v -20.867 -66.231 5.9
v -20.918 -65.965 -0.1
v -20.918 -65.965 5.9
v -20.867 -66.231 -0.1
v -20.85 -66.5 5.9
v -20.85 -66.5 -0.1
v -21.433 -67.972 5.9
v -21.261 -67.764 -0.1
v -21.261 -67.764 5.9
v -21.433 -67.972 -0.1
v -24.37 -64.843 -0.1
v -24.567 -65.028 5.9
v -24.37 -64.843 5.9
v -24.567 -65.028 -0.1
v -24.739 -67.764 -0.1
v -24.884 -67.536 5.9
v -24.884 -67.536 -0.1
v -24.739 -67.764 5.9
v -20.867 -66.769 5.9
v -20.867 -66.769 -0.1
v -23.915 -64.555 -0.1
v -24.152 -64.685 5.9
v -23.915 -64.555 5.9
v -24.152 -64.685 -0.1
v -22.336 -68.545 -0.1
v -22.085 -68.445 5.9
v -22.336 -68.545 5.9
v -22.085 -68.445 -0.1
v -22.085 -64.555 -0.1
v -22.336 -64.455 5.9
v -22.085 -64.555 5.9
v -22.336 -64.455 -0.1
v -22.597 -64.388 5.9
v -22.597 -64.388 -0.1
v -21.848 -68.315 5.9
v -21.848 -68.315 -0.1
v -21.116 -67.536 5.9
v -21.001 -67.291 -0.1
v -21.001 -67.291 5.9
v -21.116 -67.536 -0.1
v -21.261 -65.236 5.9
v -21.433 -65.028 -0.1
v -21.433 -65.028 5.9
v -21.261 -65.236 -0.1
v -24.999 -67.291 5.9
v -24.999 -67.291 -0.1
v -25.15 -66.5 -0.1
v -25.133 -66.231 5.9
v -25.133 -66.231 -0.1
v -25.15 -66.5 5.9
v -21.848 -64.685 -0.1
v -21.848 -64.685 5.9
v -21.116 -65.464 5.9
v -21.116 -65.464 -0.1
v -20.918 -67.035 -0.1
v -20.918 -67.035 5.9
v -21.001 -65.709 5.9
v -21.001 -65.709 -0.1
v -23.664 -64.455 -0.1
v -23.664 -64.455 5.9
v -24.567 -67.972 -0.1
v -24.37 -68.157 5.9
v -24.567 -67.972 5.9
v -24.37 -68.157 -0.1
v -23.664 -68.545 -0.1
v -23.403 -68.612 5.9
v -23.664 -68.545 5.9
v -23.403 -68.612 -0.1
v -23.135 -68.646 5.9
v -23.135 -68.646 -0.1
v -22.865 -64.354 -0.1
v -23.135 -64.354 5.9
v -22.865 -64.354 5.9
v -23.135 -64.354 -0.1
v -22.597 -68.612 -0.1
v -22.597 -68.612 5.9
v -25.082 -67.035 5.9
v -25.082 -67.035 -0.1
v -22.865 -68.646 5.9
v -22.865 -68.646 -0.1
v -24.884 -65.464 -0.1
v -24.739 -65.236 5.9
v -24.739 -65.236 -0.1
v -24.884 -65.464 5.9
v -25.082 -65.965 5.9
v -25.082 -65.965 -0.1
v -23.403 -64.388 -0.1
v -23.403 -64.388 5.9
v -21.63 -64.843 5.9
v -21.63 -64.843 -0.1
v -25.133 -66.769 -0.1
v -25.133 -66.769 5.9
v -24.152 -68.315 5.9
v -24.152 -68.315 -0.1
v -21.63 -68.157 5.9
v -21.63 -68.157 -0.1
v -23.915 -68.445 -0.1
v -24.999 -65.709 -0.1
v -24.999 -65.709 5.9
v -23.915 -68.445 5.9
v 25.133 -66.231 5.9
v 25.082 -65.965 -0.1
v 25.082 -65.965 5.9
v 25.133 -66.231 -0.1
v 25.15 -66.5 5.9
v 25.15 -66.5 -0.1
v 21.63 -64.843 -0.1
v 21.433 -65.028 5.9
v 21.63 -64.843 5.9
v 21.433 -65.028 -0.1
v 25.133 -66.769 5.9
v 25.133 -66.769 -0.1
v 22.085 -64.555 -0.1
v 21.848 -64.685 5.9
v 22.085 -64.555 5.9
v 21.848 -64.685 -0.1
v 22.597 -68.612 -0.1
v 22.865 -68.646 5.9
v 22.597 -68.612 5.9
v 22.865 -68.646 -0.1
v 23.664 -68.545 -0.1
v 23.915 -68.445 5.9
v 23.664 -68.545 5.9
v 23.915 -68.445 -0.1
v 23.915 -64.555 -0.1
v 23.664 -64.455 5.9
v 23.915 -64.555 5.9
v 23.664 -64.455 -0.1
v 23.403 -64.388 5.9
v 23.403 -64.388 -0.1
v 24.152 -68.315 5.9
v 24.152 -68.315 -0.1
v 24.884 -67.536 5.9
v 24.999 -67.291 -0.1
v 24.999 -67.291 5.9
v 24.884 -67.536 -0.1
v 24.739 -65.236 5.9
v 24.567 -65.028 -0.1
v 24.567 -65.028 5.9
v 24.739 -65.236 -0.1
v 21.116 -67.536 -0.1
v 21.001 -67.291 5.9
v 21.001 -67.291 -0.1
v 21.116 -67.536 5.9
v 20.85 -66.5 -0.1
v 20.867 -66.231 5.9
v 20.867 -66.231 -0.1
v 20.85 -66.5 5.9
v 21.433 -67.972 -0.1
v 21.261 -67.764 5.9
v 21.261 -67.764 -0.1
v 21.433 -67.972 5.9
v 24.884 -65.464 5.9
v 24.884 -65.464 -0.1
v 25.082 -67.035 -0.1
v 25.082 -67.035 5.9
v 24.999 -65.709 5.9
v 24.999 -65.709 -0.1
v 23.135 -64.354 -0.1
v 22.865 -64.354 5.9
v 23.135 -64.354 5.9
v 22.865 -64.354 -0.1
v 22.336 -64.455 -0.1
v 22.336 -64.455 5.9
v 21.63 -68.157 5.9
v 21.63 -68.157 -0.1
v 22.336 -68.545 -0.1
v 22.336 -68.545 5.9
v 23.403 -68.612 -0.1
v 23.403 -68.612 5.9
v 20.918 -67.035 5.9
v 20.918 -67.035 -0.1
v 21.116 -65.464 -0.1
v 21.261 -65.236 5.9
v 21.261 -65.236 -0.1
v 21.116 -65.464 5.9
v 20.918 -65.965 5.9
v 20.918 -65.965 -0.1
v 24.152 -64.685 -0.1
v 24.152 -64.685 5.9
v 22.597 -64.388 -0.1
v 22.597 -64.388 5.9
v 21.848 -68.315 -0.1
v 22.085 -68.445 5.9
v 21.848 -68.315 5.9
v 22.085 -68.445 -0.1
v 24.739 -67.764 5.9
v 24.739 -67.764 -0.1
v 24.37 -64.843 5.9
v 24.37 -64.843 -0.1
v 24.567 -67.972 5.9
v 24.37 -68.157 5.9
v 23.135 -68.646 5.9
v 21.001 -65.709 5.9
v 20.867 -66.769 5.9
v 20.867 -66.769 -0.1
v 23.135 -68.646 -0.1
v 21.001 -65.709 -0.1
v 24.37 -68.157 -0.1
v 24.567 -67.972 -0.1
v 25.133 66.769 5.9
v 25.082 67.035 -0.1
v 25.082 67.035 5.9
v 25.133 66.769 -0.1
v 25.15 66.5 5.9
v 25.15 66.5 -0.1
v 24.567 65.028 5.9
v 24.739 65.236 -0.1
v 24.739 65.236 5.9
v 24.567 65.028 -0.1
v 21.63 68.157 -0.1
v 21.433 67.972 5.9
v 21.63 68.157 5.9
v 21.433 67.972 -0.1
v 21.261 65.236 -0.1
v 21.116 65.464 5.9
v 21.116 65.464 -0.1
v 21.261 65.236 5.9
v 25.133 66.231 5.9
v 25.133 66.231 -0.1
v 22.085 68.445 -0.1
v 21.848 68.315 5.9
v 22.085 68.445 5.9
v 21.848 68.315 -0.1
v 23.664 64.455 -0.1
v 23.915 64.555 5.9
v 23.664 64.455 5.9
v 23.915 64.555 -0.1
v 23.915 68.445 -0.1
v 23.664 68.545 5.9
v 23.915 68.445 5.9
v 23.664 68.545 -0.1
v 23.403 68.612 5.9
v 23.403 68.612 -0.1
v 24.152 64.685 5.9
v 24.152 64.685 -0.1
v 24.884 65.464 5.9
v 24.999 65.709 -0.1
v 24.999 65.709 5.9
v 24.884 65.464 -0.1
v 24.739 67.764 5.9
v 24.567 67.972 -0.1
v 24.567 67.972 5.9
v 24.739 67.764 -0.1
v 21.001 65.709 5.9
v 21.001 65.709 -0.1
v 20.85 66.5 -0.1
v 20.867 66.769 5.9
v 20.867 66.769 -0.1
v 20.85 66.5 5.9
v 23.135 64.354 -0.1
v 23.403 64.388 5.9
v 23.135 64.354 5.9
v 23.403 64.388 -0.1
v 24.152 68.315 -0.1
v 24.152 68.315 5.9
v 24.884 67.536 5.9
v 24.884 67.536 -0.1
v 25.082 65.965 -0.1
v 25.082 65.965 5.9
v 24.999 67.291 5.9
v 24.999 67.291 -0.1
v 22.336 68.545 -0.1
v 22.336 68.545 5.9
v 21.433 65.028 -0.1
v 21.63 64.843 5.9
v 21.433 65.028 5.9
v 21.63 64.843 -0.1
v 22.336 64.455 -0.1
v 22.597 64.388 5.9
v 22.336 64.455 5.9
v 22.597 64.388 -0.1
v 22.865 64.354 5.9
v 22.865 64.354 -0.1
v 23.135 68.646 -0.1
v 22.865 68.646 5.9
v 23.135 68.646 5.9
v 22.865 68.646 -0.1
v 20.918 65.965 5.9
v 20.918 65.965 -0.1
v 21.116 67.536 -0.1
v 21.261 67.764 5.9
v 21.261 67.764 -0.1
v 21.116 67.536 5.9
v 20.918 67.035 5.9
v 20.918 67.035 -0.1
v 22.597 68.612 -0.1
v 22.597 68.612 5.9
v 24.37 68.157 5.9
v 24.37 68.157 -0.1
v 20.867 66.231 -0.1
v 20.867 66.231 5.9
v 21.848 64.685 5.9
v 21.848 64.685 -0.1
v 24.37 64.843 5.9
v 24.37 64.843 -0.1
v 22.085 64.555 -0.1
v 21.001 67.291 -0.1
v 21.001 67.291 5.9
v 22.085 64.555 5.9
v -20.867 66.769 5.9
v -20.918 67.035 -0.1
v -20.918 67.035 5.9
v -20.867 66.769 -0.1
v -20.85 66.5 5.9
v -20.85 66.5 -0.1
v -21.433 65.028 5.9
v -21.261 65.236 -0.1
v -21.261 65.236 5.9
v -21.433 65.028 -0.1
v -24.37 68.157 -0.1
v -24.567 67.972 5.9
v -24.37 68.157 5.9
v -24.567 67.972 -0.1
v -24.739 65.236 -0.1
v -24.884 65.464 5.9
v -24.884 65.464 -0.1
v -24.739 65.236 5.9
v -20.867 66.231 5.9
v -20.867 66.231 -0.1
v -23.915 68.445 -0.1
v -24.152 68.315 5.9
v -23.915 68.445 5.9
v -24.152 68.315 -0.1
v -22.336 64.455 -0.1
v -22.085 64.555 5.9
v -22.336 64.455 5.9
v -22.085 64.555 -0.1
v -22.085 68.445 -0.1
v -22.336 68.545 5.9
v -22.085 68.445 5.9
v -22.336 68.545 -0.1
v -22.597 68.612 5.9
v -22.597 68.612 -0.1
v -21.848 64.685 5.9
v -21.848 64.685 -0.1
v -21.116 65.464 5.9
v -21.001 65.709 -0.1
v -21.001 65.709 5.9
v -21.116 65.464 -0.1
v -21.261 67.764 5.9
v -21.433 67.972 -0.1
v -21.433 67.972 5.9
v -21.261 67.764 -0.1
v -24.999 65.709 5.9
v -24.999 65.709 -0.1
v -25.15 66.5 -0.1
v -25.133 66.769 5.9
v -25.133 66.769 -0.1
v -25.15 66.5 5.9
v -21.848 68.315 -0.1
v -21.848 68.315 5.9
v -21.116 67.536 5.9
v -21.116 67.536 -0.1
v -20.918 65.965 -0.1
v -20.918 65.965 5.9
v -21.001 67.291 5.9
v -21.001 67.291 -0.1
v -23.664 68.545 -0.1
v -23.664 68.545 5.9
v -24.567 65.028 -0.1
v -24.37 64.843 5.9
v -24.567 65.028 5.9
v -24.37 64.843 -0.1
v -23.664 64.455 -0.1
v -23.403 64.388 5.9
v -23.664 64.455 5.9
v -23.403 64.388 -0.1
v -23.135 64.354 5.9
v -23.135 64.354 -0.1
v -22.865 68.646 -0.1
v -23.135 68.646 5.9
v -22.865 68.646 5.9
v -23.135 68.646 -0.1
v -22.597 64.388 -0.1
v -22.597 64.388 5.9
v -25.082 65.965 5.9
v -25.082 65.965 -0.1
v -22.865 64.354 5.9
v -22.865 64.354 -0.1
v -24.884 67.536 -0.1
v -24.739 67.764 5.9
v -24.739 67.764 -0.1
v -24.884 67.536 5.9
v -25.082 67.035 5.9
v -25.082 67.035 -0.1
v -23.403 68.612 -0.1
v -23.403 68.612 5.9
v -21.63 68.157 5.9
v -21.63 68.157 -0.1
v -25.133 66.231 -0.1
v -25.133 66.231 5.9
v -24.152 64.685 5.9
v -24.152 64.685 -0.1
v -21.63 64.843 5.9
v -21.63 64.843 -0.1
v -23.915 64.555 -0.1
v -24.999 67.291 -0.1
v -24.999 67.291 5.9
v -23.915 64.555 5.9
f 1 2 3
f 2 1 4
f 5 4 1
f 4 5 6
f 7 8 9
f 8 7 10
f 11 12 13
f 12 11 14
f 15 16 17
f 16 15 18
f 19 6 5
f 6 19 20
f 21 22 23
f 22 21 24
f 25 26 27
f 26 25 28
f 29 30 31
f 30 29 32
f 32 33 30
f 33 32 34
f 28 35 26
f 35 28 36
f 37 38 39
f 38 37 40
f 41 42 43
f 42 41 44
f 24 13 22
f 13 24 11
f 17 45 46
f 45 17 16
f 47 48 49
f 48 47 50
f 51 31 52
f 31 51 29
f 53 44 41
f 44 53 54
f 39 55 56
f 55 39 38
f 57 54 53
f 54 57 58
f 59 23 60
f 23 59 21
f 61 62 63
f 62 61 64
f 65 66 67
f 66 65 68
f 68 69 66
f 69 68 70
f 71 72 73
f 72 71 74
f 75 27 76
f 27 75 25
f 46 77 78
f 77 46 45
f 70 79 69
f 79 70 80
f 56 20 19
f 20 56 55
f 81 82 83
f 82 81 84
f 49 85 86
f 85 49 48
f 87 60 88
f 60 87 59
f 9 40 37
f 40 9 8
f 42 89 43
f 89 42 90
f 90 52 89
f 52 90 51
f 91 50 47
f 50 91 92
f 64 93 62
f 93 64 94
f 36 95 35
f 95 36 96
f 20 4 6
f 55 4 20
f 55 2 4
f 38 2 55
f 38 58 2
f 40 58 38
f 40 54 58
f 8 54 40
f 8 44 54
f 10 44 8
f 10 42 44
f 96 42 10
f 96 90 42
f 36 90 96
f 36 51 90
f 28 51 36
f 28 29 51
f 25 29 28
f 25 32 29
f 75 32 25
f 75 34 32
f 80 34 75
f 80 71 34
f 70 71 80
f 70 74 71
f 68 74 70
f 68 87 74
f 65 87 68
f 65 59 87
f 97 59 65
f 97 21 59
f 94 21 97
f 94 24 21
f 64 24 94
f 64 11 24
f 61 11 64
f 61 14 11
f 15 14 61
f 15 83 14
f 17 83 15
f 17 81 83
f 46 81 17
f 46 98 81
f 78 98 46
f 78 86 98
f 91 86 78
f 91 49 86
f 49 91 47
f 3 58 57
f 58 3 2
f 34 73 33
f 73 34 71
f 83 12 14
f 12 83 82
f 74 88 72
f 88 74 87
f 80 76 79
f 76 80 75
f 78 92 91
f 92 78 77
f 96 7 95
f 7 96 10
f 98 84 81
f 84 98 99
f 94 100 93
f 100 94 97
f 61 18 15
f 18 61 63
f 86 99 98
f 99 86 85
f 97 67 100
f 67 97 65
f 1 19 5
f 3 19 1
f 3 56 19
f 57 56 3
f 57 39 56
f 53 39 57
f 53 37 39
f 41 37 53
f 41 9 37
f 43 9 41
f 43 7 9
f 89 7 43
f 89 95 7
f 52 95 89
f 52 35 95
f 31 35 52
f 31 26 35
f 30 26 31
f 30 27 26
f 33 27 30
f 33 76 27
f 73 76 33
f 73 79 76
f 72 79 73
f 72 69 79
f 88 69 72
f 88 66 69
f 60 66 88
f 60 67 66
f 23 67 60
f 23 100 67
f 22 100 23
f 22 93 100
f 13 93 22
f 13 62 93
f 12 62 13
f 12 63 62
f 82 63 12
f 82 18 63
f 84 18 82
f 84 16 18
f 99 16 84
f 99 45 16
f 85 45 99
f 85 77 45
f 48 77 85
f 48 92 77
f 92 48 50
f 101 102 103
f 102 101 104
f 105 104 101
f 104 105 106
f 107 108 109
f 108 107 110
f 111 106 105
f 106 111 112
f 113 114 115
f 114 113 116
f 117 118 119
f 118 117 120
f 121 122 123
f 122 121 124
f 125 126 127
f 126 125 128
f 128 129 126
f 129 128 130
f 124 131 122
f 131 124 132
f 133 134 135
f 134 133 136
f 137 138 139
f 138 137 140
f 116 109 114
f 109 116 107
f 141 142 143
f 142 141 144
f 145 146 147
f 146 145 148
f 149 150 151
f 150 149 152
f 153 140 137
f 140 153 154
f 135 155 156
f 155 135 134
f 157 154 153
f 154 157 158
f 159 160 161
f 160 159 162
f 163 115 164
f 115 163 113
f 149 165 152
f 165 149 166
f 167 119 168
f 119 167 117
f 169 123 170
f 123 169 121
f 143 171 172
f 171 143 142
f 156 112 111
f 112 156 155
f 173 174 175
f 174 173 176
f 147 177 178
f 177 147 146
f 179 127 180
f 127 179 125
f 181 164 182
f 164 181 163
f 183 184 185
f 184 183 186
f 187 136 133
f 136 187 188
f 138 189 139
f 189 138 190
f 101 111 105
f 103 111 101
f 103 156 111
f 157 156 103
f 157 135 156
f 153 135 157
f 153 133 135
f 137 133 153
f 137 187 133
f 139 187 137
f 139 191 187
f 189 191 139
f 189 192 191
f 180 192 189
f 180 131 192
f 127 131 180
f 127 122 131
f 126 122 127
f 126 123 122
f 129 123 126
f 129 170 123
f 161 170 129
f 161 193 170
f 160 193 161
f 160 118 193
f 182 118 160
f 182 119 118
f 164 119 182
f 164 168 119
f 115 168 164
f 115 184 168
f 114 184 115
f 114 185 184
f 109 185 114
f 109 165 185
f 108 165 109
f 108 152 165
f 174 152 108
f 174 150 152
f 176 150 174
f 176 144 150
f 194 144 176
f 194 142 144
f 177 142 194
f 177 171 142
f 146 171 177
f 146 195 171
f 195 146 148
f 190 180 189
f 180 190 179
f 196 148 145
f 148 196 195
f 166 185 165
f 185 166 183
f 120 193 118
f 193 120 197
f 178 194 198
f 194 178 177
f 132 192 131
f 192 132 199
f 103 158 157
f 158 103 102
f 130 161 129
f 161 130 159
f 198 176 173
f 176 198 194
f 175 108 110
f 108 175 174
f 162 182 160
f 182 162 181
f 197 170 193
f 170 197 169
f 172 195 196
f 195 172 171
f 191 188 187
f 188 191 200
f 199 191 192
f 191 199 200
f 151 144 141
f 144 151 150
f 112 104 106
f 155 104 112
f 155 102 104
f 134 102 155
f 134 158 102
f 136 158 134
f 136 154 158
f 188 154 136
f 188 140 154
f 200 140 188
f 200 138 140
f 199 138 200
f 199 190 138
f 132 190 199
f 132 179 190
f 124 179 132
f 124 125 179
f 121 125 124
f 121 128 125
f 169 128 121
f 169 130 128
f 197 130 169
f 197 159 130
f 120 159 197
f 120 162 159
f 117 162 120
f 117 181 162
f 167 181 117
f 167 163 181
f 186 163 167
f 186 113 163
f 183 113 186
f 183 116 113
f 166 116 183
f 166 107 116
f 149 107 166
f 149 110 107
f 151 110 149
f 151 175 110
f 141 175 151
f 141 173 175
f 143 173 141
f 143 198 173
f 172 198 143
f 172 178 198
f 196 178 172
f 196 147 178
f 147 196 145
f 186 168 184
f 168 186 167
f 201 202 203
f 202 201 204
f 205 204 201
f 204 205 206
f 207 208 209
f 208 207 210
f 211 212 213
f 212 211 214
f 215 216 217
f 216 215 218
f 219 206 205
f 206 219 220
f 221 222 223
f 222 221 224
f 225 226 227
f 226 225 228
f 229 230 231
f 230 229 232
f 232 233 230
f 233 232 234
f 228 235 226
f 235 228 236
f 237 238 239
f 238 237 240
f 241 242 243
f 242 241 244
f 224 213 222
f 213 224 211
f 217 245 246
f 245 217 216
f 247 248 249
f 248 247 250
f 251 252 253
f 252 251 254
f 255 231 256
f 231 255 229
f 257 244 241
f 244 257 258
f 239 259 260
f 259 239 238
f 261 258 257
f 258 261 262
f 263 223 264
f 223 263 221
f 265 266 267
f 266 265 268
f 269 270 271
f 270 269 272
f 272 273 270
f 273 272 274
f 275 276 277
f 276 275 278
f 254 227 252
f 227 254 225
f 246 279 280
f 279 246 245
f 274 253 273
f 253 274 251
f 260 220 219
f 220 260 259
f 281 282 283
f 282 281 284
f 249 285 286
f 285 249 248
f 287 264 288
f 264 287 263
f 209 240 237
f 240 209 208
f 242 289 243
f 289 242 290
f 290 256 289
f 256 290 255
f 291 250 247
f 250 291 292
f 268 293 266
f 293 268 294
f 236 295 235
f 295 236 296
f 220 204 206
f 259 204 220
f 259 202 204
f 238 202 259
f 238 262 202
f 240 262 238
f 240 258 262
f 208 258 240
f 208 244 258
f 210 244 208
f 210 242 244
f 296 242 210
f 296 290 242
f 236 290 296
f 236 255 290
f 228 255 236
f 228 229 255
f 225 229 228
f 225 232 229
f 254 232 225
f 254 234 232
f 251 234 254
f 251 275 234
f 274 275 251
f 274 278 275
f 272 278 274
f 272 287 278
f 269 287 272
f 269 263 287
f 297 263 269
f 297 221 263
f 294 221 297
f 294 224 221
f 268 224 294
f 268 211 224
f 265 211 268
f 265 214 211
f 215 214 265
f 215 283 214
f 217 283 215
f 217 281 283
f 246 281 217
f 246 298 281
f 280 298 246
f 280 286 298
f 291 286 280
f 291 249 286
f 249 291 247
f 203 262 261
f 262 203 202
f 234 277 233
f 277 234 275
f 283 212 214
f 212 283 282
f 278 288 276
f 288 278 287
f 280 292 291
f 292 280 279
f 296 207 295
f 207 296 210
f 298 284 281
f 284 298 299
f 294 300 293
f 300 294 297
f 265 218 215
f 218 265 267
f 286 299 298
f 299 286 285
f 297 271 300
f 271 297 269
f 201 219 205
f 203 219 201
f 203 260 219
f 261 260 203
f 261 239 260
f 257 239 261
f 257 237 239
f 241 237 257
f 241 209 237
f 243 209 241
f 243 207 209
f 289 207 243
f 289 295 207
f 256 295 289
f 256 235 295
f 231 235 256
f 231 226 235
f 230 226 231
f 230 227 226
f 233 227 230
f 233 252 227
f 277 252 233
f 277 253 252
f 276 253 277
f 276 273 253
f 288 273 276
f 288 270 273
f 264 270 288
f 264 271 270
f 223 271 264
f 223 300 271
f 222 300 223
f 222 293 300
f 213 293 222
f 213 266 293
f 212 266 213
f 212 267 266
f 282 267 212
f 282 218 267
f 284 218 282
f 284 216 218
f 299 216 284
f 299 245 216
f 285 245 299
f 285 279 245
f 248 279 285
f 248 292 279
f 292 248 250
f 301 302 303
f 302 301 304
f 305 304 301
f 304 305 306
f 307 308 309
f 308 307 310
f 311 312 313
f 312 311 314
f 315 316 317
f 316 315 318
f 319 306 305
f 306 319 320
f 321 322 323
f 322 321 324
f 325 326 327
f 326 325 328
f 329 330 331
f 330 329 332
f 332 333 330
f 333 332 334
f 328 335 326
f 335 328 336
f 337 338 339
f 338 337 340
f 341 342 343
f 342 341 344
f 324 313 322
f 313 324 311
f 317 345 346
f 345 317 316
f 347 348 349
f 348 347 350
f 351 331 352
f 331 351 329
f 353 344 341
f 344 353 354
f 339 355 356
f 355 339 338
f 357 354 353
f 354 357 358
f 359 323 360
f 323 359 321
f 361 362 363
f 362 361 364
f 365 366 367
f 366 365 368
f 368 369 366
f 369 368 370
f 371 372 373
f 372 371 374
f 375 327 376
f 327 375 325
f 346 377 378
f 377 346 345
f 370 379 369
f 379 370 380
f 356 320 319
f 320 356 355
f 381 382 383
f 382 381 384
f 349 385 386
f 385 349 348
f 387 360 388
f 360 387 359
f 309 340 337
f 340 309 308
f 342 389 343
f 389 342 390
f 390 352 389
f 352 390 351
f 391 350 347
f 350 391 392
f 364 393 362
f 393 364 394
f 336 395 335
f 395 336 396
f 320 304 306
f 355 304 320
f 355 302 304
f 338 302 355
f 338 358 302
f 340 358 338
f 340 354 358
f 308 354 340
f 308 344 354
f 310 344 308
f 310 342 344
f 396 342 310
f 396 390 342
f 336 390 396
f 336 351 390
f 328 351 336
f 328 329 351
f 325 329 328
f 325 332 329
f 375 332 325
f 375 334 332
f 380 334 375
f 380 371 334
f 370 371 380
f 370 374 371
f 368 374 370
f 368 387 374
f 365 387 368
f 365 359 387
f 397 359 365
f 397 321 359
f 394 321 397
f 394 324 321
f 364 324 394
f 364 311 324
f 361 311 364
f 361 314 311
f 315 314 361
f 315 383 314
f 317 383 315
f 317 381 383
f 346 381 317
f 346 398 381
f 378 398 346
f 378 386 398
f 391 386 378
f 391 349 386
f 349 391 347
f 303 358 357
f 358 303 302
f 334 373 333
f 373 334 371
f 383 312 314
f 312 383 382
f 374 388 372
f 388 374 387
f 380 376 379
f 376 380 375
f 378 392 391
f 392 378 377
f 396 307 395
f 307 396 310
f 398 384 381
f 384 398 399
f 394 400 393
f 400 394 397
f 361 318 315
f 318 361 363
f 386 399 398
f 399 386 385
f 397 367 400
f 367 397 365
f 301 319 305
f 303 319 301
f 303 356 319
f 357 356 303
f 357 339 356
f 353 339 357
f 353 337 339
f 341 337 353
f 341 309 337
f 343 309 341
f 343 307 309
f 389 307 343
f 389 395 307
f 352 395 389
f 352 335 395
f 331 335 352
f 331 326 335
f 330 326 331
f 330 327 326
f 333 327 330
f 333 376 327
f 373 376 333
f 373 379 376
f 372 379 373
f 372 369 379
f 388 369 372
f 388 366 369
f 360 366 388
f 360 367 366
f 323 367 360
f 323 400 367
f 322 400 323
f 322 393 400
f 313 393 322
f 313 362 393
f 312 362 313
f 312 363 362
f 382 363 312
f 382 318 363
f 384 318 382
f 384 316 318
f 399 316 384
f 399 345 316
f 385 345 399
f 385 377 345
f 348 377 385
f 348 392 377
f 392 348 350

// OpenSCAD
// file: ../robot_settings.scad
main_box_x = 100; // 96
main_box_y = 102;
main_box_z = 74; // 74.5

lfp_main_box_x = 65;
lfp_main_box_y = 152;
lfp_main_box_z = 94;

wall_thickness = 5;

rail_gap = 2;
rail_inset = 7;

rail_thickness = 7;
rail_length = 250;
 rail_width = 260;

lfp_battery_width = 65.5;
lfp_battery_depth = 150.5;
lfp_battery_height = 93;
lfp_battery_midterrace_width = 64.8;
lfp_battery_midterrace_depth = 150.2;
lfp_battery_midterrace_height = 7.8;
lfp_battery_topterrace_width = 62.8;
lfp_battery_topterrace_depth = 149.4;
lfp_battery_topterrace_height = 6.6;

// red right
// black left
lfp_battery_terminal_width = 9.2;
lfp_battery_terminal_depth = 9.5;
lfp_battery_terminal_depth_setback = 4.4;
lfp_battery_terminal_width_setback = 5.9;

raspberry_pi_screw_seperation_y = 57;
raspberry_pi_screw_seperation_z = 48;
raspberry_pi_peg_h = 5;

battery_box_peg_h = 6;
battery_box_peg_d = 9.5;
battery_box_peg_cutout = 5;

gears_module = 1;
pinion_gear_teeth = 32;
pinion_gear_width = 5;
pinion_gear_bore = 8;

gears_setback_distance = 25;
gear_post_height = 2 * pinion_gear_width + rail_thickness + 8 ;

steering_motor_mount_x = 45;
steering_motor_mount_y = 36;
steering_motor_mount_z = 18;
steering_motor_mount_setback_distance = gears_setback_distance + 16;

dc_motor_drivertype = "Teyleten"; // Teyleten
isAdafruit = (dc_motor_drivertype == "Adafruit");

drv8871_x = isAdafruit ? 20.3 : 21.6;
drv8871_y = isAdafruit ?  24 : 25;

drv8871_z = 2;
drv8871_screw_d = 2.5;
drv8871_solder_points_z = 2;

drv8871mount_edge_x = 1.5;
drv8871mount_edge_wall = 3;
drv8871mount_z = 5;
drv8871mount_x = drv8871_x +  drv8871mount_edge_wall - 2* drv8871mount_edge_x;
drv8871mount_y = 19;

drv8871_screw_distance = 15.64;
drv8871_solder_points_d = 1.66;
drv8871_solder_offset_y = 4.4;
drv8871_solder_inner_points_distance = 5;
drv8871_solder_outer_points_distance = 12;

dc_motor_75_1_encoder_z = 14.75;
dc_motor_75_1_encoder_d = 24.5;
dc_motor_75_1_housing_z = 30;
dc_motor_75_1_housing_d = 24.1;
dc_motor_75_1_gearbox_z = 23;
dc_motor_75_1_gearbox_d = 24.8;
dc_motor_75_1_z = dc_motor_75_1_encoder_z + dc_motor_75_1_housing_z + dc_motor_75_1_gearbox_z;

dc_motor_housing_minus_encoder_z = 48;
dc_motor_encoder_z = 9.33;
dc_motor_encoder_wheel_d = 13.4;
dc_motor_encoder_wheel_thickness = 5;
dc_motor_encoder_wheel_gap = 3;
dc_motor_encoder_circuit_thickness = 2;
dc_motor_z = dc_motor_housing_minus_encoder_z + dc_motor_encoder_z + dc_motor_encoder_wheel_thickness + dc_motor_encoder_wheel_gap + dc_motor_encoder_circuit_thickness;
dc_motor_cutout_d = 24.8;
dc_motor_cutout_z = 19.5;


M3_shaft_d = 2.82;

dc_motor_screw_head_z = 2;
dc_motor_screw_head_d = 5.6;
dc_motor_screw_d = 3.2;
dc_motor_screw_offset = 8.5;

dc_motor_axle_ring_z = 3;
dc_motor_axle_ring_d = 7.2;
dc_motor_axle_cutout_d = 4.2;
dc_motor_axle_cutout_z = 10;
dc_motor_axle_notch_cutout = 0.4;
dc_motor_axle_notch_cutout_z = 6;

pdmount_x = 20;
pdmount_y = 30;
pdmount_z = 2;
pdmount_edge_x = 1.5;
pdmount_edge_wall = 3;

steering_shaft_z = 45;
steering_shaft_d = 7;
steering_shaft_motor_fitting_d = 9;
coupler_length = 24.6;
coupler_diameter = 14;
coupler_screw_d = 4;
coupler_screw_z_offset = 5;
coupler_gear_side_insert = 12.6;
steering_shaft_with_coupler_z = steering_shaft_z - coupler_gear_side_insert;

lidar_mount_y = 110;
lidar_mount_x = 65 + 20;
lidar_narrow_screws = 40;
lidar_wide_screws = 56;
lidar_front_to_back_screws = 70;
lidar_screw_d = 3;
lidar_circuitboard_x = 20;
lidar_circuitboard_y = 35;
lidar_circuitboard_z = 1.2;
lidar_cord_length = 29;

ball_bearing_height = 7;
ball_bearing_outer_diameter = 22;
ball_bearing_inner_diameter = 8;

M4_diameter = 5.1;
M3_diameter = 2.9;
M3_length = 35;
M3_cap_length= 3;
M3_cap_diameter = 5.44;

suspension_spring_outer_diameter = 8;
suspension_spring_inner_diameter = 5.3;

armature_holder_height = 20;
armature_holder_thickness = 8;
pull_bar_peg_r = 3.2;
apparatus_locking_peg_d = 4;

rack_module = 1;
rack_length = main_box_x;
rack_height = 5;
rack_width = 10;
rack_teeth = 30;
rack_bore = 3;

pull_bar_length = rail_width / 2 - rack_length + 1;

// tire hardware
axle_length = 24 + ball_bearing_height; 
axle_reciever_inner_diameter = 8.2;
axle_reciever_outer_diameter = 12;
axle_reciever_length = 18.8;
axle_notch_length = 15;
axle_notch_cutout = 2.4;

// power distribution bar
power_bar_cutout_x = 96;
power_bar_y = 19.1;
power_bar_z = 1.5;
power_bar_screw_distance = 91.4;
power_bar_screw_d = 2.8;
power_bar_standoff_z = 5;
power_bar_standoff_d = 6.83;

pico_expander_width = 63;
pico_expander_height = 57;
pico_screw_hole_offset = 3;
pico_screw_hole_d = 2.5;

usbhub_thickness = 11.7;
usbhub_depth = 37.5;
usbhub_width = 86.7;
usbhub_end_port_width = 14.8;
usbhub_end_port_height = 12;
usbhub_front_face_safe_zone_left = 15;
usbhub_front_face_safe_zone_right = 14.8;

switch_w = 16;
switch_cutout_d = 12.2;
switch_bump_h = 2;
switch_bump_l = 18.2;

i2c_mount_thickness = 3;
i2c_w = 28;
i2c_l = 28;
i2c_circuitboard_thickness = 1.23;
i2c_bottom_notch_w = 14.35;
i2c_bottom_notch_depth = 1;
i2c_screw_hole_d = 1.9;
i2c_screw_hole_offset = 1.4;
i2c_pin_l = 11;
i2c_pin_d = 0.8;
i2c_pin_offset = 1.5;
i2c_pin_separation = 2.5;
i2c_all_pins_l = 8.3;
i2c_screen_thickness = 1.88;
i2c_screen_w = 14.6;
i2c_screen_d = 27;
i2c_screen_offset = 4.1;
// main file
   include <../robot_settings.scad>
   $fn = 50;
 
 module battery_box_peg_mounts(
  show_mounts = false,
  show_points = true) 
  {

if (show_mounts) 
{
  // temporary base platform
  //translate([0, 0, battery_box_peg_d / 2 + 3])
  //cube([main_box_x, main_box_y, 2]);
  
    translate([-lfp_main_box_x / 2, -lfp_main_box_y / 2, battery_box_peg_d / 2 + .1])
    {
     color("green")
    translate([battery_box_peg_d, battery_box_peg_d, 0])
      difference() {
        cylinder(h = battery_box_peg_h, d = battery_box_peg_d, center = true);
       translate([0, 0, -.1])
        cylinder(h = battery_box_peg_h + 1, d = battery_box_peg_cutout, center = true); 
      }

  color("red")
    translate([-battery_box_peg_d + lfp_main_box_x, battery_box_peg_d, 0])
      difference() {
        cylinder(h = battery_box_peg_h, d = battery_box_peg_d, center = true);
       translate([0, 0, -.1])
        cylinder(h = battery_box_peg_h + 1, d = battery_box_peg_cutout, center = true); 
      }

  color("white")
    translate([-battery_box_peg_d + lfp_main_box_x, -battery_box_peg_d + lfp_main_box_y, 0])
      difference() {
        cylinder(h = battery_box_peg_h, d = battery_box_peg_d, center = true);
       translate([0, 0, -.1])
        cylinder(h = battery_box_peg_h + 1, d = battery_box_peg_cutout, center = true); 
      }
     
    translate([battery_box_peg_d, -battery_box_peg_d + lfp_main_box_y, 0])
      difference() {
        cylinder(h = battery_box_peg_h, d = battery_box_peg_d, center = true);
       translate([0, 0, -.1])
        cylinder(h = battery_box_peg_h + 1, d = battery_box_peg_cutout, center = true); 
      } 
    }
  }
    if (show_points) {
      // temporary base platform
//     translate([-main_box_x / 2, -main_box_y / 2, 0])
//     cube([main_box_x, main_box_y, 2]);
      
      cutout_offset = .7;
      
      // battery box attachment points
       translate([-lfp_main_box_x / 2, -lfp_main_box_y / 2,  - .1]) 
      {
        color("green")
        translate([battery_box_peg_d, battery_box_peg_d, 0])
        cylinder(h = battery_box_peg_h, d = battery_box_peg_cutout - cutout_offset);

        color("red")
        translate([-battery_box_peg_d + lfp_main_box_x, battery_box_peg_d, 0])
        cylinder(h = battery_box_peg_h, d = battery_box_peg_cutout - cutout_offset);
        
        color("white")
        translate([-battery_box_peg_d + lfp_main_box_x, -battery_box_peg_d + lfp_main_box_y, 0])
        cylinder(h = battery_box_peg_h, d = battery_box_peg_cutout - cutout_offset);

        translate([battery_box_peg_d, -battery_box_peg_d + lfp_main_box_y, 0])
        cylinder(h = battery_box_peg_h, d = battery_box_peg_cutout - cutout_offset);
       }
   }

}
battery_box_peg_mounts();
